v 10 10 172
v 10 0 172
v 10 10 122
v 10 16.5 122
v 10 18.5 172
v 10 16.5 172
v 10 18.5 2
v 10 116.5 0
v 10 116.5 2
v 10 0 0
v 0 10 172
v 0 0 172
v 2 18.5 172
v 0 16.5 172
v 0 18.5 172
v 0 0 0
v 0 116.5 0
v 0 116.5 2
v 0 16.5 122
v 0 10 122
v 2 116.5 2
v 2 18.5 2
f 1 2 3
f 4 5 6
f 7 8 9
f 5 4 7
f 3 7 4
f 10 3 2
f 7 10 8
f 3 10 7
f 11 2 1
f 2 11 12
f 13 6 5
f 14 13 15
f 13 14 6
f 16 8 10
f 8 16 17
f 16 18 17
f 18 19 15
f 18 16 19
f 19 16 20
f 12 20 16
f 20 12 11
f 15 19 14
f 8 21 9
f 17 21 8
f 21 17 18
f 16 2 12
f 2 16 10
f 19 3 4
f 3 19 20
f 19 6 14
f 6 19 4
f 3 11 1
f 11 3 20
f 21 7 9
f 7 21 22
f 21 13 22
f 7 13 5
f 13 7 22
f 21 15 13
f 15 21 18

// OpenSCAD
thick = 2;
spaceH = 122;
boardD = 6.5;

W = 10;
D = 10 + boardD + 100;
H = spaceH + 50;

difference() {
    cube([W, D, H]);
    translate([0, 10, spaceH])
        cube([W, boardD, H - spaceH]);
    translate([thick, 10 + boardD + thick, thick])
        cube([W, D, H]);
    rotate([0, 90, 0])
        linear_extrude(thick)
            polygon([[-thick, D], [-H, D], [-H, 10 + boardD + thick]]);
}
